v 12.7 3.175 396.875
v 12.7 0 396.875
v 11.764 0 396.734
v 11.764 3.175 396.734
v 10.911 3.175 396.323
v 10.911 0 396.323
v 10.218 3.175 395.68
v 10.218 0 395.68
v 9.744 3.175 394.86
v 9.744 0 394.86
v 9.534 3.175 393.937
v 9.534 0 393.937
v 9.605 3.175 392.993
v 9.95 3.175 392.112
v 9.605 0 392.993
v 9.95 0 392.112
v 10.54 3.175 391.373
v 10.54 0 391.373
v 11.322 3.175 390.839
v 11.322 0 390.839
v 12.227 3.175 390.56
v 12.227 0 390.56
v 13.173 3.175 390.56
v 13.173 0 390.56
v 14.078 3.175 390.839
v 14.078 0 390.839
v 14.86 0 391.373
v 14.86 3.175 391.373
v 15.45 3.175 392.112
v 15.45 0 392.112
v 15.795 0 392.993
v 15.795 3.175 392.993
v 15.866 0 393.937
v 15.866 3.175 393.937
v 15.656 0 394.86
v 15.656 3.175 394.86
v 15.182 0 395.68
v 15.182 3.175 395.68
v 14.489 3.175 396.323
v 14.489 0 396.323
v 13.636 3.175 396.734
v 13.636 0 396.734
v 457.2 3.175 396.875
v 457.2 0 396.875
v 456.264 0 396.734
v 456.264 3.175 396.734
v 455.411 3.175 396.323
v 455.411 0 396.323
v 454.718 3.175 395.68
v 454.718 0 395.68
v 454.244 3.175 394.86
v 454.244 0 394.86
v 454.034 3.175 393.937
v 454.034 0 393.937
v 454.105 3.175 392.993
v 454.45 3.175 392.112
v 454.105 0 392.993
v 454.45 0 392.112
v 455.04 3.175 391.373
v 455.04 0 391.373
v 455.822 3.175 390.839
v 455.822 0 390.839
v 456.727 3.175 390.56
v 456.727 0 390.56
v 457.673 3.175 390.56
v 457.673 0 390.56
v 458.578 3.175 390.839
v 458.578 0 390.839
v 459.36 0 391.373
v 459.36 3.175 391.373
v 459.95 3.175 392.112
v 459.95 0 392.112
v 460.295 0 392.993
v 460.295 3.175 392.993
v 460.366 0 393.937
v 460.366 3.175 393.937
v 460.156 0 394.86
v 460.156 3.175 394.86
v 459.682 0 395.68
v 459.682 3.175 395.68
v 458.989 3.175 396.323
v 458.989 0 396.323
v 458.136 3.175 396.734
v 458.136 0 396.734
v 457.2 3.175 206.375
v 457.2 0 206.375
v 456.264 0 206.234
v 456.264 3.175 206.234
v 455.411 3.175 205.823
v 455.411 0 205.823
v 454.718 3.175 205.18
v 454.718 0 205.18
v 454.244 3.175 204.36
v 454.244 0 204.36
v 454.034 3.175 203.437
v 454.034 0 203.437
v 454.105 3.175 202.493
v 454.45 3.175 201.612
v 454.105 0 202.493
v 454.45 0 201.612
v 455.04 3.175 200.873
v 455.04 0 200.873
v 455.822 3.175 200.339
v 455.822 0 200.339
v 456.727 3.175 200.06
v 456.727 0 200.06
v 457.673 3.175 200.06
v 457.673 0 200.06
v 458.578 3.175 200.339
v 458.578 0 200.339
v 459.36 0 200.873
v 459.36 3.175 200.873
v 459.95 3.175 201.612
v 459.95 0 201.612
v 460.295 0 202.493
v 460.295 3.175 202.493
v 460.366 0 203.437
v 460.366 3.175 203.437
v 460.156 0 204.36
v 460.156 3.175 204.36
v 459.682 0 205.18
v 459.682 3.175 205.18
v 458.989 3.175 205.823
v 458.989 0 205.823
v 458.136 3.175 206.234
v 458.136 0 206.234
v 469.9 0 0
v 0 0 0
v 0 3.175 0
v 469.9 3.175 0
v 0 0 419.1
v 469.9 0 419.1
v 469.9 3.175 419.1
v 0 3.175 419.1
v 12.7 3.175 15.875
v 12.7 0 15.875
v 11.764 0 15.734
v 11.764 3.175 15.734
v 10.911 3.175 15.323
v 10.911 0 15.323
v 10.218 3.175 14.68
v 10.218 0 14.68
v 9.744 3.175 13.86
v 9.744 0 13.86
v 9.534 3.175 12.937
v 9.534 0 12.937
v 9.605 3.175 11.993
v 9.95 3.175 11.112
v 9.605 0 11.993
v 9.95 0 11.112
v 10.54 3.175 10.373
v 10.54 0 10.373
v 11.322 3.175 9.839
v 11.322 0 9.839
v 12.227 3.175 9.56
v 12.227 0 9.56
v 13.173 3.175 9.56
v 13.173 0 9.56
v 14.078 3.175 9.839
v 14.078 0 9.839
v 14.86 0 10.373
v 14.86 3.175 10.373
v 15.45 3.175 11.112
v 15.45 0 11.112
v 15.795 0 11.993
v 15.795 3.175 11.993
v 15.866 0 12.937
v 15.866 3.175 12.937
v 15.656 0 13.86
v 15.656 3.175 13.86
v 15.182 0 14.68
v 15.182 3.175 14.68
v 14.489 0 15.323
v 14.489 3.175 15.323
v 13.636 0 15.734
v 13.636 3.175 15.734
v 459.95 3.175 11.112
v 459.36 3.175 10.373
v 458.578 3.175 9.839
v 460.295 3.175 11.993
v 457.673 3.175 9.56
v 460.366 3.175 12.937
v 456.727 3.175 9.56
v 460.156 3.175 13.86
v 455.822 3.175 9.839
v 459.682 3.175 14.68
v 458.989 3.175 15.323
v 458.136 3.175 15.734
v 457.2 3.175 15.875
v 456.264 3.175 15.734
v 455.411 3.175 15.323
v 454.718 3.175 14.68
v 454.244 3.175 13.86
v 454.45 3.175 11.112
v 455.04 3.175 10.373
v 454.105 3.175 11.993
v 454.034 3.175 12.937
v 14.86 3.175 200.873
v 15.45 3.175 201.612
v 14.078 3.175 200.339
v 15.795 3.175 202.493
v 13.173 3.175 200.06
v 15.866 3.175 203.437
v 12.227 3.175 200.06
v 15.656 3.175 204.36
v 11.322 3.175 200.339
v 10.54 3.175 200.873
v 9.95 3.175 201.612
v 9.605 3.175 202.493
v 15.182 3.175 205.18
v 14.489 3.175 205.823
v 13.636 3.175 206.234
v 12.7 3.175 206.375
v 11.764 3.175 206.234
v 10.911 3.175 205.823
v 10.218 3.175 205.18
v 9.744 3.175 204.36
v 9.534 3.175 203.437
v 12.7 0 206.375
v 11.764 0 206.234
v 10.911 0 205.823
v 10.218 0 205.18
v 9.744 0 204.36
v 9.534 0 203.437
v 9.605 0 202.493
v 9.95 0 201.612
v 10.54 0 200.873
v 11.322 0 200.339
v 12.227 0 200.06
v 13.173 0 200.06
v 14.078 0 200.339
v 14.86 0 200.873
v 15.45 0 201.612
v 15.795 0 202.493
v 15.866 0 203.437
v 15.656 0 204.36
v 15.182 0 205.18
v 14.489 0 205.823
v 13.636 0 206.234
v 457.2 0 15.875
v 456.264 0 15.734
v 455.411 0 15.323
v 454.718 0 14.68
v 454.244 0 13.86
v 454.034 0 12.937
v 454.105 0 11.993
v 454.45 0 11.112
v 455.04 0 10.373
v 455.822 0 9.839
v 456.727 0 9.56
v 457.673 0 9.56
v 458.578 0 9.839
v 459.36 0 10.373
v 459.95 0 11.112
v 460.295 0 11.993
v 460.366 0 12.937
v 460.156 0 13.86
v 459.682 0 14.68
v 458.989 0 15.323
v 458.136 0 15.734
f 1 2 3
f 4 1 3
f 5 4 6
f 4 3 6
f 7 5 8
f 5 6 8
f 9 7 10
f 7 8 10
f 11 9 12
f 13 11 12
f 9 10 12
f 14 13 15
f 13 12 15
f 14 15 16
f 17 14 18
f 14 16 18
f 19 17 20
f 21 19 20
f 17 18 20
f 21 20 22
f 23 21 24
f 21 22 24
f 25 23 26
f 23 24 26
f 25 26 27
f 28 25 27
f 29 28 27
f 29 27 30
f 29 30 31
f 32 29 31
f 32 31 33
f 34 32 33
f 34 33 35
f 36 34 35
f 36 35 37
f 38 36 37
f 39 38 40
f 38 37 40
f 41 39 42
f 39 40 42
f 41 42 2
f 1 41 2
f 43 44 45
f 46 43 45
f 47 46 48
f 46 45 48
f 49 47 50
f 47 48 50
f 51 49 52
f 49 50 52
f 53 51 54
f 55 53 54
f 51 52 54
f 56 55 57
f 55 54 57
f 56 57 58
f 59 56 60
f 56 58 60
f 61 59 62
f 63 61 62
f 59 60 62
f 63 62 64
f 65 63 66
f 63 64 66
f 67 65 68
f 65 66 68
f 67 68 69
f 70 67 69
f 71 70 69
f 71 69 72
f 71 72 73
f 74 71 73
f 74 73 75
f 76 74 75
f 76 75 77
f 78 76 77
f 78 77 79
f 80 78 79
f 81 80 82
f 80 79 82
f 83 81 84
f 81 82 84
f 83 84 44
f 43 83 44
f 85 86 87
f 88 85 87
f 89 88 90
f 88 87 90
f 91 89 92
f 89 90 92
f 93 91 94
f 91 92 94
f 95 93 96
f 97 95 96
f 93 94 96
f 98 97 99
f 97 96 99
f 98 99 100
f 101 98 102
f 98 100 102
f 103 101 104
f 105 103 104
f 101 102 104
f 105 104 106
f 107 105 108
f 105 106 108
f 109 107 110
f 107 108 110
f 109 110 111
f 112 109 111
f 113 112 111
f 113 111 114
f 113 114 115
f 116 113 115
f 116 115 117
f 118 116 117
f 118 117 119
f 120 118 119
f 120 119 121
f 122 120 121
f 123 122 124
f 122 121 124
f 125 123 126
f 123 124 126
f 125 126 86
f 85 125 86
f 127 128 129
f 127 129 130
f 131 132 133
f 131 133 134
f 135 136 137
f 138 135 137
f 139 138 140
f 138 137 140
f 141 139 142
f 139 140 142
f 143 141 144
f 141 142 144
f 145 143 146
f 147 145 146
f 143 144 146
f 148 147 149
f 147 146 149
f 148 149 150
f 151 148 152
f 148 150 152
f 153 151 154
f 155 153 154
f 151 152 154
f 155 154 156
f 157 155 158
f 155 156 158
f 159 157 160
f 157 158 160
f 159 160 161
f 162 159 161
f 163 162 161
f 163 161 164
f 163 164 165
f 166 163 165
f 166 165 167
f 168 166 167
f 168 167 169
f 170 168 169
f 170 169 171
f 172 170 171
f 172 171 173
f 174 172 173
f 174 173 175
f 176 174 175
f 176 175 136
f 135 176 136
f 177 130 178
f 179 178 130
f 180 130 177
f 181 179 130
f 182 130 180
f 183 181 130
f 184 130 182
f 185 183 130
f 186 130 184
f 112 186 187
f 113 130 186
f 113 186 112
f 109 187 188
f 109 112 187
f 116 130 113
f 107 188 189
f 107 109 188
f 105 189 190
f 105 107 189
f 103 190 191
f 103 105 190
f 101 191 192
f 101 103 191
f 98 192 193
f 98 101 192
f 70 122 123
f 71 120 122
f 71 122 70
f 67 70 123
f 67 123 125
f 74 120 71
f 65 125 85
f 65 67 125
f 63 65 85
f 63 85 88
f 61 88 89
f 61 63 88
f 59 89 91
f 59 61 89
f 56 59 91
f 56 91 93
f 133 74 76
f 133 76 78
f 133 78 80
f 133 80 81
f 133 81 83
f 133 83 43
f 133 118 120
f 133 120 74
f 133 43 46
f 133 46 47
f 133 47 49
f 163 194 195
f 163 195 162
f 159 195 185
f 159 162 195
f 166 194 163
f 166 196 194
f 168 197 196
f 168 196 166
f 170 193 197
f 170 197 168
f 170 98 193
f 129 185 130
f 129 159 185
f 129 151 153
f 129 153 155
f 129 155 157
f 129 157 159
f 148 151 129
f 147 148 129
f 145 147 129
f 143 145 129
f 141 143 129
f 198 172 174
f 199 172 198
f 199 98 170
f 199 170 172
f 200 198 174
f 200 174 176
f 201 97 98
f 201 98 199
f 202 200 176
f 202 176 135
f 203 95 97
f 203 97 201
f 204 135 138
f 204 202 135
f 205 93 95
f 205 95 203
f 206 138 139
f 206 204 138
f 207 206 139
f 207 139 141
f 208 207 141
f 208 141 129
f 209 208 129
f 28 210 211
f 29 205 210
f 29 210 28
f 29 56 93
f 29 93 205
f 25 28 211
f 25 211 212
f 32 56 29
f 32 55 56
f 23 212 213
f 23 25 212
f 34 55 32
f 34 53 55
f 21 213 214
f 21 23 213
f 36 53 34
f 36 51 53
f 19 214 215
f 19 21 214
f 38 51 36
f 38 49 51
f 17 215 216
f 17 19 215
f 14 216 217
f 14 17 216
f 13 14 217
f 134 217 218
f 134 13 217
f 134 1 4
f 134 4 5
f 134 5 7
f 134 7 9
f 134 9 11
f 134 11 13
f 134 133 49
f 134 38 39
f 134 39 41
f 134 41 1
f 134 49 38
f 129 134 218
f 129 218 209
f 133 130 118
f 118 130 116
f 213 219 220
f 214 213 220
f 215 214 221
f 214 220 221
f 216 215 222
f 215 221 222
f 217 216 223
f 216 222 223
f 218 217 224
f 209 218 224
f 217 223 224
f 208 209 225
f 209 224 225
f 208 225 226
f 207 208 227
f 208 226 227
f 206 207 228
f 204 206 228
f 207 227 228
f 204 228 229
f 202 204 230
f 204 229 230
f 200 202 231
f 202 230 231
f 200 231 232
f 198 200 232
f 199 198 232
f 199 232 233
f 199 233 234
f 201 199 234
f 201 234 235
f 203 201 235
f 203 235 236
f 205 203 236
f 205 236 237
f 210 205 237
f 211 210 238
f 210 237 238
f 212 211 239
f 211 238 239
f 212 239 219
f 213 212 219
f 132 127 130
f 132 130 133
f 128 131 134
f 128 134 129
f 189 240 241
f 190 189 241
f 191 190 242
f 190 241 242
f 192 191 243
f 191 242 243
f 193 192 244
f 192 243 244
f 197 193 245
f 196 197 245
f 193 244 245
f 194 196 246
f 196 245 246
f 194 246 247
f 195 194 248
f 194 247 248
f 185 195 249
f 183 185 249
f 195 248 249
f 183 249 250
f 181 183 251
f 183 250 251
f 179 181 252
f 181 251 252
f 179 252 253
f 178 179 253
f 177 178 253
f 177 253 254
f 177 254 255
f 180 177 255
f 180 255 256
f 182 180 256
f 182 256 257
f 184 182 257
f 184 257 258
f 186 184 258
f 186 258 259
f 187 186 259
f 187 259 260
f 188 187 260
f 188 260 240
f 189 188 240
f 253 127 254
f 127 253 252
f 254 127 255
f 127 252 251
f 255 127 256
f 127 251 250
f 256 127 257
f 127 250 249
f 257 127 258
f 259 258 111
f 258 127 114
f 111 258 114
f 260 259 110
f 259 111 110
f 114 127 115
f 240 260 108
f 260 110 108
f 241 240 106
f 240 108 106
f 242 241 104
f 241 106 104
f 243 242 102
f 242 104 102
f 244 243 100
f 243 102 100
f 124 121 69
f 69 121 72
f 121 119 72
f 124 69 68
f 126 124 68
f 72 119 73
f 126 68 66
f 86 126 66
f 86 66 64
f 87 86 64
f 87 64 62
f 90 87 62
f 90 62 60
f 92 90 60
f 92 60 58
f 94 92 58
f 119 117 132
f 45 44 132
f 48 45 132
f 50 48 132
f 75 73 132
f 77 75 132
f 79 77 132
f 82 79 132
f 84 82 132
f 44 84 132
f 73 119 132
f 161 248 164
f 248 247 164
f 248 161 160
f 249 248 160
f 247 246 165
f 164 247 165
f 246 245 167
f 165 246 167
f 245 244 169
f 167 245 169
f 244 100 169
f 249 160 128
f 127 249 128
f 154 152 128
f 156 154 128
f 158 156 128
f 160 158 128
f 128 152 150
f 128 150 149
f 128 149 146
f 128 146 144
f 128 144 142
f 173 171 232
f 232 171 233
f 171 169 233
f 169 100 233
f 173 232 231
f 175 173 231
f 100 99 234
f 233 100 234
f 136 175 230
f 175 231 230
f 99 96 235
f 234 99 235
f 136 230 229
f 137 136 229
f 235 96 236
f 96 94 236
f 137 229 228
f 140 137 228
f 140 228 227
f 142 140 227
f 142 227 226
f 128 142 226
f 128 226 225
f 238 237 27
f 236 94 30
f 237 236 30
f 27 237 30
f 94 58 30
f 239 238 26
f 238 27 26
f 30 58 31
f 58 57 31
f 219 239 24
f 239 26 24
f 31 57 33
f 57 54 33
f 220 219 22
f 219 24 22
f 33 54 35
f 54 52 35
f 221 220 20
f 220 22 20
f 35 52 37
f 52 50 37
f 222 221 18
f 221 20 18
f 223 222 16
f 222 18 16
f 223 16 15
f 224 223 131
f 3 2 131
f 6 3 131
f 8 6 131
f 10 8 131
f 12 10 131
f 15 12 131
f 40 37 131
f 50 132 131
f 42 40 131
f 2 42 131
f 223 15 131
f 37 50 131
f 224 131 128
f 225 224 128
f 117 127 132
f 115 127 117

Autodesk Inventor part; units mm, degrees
ref_plane "YZ Plane" through (0, 0, 0) normal (1, 0, 0) x (0, 1, 0)
ref_plane "XZ Plane" through (0, 0, 0) normal (0, 1, 0) x (-1, 0, 0)
ref_plane "XY Plane" through (0, 0, 0) normal (0, 0, 1) x (1, 0, 0)
sketch "Sketch1" plane through (0, 0, 0) normal (0, 1, 0) x (-1, 0, 0)
  line L0 (0, 0) -> (-469.9, 0)
  line L1 (-469.9, 0) -> (-469.9, 419.1)
  line L2 (-469.9, 419.1) -> (0, 419.1)
  line L3 (0, 419.1) -> (0, 0)
  dimension "d0" = 469.9
  dimension "d1" = 419.1
extrude "Extrusion1" add sketch "Sketch1" along normal blind 3.175
sketch "Sketch2" plane through (0, 3.175, 0) normal (0, 1, 0) x (1, 0, 0)
  line L0 (469.9, 0) -> (0, 0) projected
  line L1 (0, 0) -> (0, -419.1) projected
  line L2 (0, -419.1) -> (469.9, -419.1) projected
  line L3 (469.9, -419.1) -> (469.9, 0) projected
  point P0 (12.7, -12.7)
  point P1 (12.7, -203.2)
  point P2 (12.7, -393.7)
  point P3 (457.2, -12.7)
  point P4 (457.2, -203.2)
  point P5 (457.2, -393.7)
  dimension "d4" = 12.7
  dimension "d5" = 12.7
  dimension "d6" = 12.7
  dimension "d7" = 12.7
  dimension "d8" = 12.7
  dimension "d11" = 12.7
  dimension "d12" = 12.7
  dimension "d13" = 12.7
  dimension "d14" = 203.2
  dimension "d15" = 203.2
  dimension "d16" = 25.4
  dimension "d17" = 25.4
hole "Hole1" at (12.7, 3.175, 12.7) at (12.7, 3.175, 203.2) at (12.7, 3.175, 393.7) at (457.2, 3.175, 12.7) at (457.2, 3.175, 203.2) at (457.2, 3.175, 393.7) direction (0, -1, 0) diameter 6.35 end through all
properties part number "polycarb bottom"
